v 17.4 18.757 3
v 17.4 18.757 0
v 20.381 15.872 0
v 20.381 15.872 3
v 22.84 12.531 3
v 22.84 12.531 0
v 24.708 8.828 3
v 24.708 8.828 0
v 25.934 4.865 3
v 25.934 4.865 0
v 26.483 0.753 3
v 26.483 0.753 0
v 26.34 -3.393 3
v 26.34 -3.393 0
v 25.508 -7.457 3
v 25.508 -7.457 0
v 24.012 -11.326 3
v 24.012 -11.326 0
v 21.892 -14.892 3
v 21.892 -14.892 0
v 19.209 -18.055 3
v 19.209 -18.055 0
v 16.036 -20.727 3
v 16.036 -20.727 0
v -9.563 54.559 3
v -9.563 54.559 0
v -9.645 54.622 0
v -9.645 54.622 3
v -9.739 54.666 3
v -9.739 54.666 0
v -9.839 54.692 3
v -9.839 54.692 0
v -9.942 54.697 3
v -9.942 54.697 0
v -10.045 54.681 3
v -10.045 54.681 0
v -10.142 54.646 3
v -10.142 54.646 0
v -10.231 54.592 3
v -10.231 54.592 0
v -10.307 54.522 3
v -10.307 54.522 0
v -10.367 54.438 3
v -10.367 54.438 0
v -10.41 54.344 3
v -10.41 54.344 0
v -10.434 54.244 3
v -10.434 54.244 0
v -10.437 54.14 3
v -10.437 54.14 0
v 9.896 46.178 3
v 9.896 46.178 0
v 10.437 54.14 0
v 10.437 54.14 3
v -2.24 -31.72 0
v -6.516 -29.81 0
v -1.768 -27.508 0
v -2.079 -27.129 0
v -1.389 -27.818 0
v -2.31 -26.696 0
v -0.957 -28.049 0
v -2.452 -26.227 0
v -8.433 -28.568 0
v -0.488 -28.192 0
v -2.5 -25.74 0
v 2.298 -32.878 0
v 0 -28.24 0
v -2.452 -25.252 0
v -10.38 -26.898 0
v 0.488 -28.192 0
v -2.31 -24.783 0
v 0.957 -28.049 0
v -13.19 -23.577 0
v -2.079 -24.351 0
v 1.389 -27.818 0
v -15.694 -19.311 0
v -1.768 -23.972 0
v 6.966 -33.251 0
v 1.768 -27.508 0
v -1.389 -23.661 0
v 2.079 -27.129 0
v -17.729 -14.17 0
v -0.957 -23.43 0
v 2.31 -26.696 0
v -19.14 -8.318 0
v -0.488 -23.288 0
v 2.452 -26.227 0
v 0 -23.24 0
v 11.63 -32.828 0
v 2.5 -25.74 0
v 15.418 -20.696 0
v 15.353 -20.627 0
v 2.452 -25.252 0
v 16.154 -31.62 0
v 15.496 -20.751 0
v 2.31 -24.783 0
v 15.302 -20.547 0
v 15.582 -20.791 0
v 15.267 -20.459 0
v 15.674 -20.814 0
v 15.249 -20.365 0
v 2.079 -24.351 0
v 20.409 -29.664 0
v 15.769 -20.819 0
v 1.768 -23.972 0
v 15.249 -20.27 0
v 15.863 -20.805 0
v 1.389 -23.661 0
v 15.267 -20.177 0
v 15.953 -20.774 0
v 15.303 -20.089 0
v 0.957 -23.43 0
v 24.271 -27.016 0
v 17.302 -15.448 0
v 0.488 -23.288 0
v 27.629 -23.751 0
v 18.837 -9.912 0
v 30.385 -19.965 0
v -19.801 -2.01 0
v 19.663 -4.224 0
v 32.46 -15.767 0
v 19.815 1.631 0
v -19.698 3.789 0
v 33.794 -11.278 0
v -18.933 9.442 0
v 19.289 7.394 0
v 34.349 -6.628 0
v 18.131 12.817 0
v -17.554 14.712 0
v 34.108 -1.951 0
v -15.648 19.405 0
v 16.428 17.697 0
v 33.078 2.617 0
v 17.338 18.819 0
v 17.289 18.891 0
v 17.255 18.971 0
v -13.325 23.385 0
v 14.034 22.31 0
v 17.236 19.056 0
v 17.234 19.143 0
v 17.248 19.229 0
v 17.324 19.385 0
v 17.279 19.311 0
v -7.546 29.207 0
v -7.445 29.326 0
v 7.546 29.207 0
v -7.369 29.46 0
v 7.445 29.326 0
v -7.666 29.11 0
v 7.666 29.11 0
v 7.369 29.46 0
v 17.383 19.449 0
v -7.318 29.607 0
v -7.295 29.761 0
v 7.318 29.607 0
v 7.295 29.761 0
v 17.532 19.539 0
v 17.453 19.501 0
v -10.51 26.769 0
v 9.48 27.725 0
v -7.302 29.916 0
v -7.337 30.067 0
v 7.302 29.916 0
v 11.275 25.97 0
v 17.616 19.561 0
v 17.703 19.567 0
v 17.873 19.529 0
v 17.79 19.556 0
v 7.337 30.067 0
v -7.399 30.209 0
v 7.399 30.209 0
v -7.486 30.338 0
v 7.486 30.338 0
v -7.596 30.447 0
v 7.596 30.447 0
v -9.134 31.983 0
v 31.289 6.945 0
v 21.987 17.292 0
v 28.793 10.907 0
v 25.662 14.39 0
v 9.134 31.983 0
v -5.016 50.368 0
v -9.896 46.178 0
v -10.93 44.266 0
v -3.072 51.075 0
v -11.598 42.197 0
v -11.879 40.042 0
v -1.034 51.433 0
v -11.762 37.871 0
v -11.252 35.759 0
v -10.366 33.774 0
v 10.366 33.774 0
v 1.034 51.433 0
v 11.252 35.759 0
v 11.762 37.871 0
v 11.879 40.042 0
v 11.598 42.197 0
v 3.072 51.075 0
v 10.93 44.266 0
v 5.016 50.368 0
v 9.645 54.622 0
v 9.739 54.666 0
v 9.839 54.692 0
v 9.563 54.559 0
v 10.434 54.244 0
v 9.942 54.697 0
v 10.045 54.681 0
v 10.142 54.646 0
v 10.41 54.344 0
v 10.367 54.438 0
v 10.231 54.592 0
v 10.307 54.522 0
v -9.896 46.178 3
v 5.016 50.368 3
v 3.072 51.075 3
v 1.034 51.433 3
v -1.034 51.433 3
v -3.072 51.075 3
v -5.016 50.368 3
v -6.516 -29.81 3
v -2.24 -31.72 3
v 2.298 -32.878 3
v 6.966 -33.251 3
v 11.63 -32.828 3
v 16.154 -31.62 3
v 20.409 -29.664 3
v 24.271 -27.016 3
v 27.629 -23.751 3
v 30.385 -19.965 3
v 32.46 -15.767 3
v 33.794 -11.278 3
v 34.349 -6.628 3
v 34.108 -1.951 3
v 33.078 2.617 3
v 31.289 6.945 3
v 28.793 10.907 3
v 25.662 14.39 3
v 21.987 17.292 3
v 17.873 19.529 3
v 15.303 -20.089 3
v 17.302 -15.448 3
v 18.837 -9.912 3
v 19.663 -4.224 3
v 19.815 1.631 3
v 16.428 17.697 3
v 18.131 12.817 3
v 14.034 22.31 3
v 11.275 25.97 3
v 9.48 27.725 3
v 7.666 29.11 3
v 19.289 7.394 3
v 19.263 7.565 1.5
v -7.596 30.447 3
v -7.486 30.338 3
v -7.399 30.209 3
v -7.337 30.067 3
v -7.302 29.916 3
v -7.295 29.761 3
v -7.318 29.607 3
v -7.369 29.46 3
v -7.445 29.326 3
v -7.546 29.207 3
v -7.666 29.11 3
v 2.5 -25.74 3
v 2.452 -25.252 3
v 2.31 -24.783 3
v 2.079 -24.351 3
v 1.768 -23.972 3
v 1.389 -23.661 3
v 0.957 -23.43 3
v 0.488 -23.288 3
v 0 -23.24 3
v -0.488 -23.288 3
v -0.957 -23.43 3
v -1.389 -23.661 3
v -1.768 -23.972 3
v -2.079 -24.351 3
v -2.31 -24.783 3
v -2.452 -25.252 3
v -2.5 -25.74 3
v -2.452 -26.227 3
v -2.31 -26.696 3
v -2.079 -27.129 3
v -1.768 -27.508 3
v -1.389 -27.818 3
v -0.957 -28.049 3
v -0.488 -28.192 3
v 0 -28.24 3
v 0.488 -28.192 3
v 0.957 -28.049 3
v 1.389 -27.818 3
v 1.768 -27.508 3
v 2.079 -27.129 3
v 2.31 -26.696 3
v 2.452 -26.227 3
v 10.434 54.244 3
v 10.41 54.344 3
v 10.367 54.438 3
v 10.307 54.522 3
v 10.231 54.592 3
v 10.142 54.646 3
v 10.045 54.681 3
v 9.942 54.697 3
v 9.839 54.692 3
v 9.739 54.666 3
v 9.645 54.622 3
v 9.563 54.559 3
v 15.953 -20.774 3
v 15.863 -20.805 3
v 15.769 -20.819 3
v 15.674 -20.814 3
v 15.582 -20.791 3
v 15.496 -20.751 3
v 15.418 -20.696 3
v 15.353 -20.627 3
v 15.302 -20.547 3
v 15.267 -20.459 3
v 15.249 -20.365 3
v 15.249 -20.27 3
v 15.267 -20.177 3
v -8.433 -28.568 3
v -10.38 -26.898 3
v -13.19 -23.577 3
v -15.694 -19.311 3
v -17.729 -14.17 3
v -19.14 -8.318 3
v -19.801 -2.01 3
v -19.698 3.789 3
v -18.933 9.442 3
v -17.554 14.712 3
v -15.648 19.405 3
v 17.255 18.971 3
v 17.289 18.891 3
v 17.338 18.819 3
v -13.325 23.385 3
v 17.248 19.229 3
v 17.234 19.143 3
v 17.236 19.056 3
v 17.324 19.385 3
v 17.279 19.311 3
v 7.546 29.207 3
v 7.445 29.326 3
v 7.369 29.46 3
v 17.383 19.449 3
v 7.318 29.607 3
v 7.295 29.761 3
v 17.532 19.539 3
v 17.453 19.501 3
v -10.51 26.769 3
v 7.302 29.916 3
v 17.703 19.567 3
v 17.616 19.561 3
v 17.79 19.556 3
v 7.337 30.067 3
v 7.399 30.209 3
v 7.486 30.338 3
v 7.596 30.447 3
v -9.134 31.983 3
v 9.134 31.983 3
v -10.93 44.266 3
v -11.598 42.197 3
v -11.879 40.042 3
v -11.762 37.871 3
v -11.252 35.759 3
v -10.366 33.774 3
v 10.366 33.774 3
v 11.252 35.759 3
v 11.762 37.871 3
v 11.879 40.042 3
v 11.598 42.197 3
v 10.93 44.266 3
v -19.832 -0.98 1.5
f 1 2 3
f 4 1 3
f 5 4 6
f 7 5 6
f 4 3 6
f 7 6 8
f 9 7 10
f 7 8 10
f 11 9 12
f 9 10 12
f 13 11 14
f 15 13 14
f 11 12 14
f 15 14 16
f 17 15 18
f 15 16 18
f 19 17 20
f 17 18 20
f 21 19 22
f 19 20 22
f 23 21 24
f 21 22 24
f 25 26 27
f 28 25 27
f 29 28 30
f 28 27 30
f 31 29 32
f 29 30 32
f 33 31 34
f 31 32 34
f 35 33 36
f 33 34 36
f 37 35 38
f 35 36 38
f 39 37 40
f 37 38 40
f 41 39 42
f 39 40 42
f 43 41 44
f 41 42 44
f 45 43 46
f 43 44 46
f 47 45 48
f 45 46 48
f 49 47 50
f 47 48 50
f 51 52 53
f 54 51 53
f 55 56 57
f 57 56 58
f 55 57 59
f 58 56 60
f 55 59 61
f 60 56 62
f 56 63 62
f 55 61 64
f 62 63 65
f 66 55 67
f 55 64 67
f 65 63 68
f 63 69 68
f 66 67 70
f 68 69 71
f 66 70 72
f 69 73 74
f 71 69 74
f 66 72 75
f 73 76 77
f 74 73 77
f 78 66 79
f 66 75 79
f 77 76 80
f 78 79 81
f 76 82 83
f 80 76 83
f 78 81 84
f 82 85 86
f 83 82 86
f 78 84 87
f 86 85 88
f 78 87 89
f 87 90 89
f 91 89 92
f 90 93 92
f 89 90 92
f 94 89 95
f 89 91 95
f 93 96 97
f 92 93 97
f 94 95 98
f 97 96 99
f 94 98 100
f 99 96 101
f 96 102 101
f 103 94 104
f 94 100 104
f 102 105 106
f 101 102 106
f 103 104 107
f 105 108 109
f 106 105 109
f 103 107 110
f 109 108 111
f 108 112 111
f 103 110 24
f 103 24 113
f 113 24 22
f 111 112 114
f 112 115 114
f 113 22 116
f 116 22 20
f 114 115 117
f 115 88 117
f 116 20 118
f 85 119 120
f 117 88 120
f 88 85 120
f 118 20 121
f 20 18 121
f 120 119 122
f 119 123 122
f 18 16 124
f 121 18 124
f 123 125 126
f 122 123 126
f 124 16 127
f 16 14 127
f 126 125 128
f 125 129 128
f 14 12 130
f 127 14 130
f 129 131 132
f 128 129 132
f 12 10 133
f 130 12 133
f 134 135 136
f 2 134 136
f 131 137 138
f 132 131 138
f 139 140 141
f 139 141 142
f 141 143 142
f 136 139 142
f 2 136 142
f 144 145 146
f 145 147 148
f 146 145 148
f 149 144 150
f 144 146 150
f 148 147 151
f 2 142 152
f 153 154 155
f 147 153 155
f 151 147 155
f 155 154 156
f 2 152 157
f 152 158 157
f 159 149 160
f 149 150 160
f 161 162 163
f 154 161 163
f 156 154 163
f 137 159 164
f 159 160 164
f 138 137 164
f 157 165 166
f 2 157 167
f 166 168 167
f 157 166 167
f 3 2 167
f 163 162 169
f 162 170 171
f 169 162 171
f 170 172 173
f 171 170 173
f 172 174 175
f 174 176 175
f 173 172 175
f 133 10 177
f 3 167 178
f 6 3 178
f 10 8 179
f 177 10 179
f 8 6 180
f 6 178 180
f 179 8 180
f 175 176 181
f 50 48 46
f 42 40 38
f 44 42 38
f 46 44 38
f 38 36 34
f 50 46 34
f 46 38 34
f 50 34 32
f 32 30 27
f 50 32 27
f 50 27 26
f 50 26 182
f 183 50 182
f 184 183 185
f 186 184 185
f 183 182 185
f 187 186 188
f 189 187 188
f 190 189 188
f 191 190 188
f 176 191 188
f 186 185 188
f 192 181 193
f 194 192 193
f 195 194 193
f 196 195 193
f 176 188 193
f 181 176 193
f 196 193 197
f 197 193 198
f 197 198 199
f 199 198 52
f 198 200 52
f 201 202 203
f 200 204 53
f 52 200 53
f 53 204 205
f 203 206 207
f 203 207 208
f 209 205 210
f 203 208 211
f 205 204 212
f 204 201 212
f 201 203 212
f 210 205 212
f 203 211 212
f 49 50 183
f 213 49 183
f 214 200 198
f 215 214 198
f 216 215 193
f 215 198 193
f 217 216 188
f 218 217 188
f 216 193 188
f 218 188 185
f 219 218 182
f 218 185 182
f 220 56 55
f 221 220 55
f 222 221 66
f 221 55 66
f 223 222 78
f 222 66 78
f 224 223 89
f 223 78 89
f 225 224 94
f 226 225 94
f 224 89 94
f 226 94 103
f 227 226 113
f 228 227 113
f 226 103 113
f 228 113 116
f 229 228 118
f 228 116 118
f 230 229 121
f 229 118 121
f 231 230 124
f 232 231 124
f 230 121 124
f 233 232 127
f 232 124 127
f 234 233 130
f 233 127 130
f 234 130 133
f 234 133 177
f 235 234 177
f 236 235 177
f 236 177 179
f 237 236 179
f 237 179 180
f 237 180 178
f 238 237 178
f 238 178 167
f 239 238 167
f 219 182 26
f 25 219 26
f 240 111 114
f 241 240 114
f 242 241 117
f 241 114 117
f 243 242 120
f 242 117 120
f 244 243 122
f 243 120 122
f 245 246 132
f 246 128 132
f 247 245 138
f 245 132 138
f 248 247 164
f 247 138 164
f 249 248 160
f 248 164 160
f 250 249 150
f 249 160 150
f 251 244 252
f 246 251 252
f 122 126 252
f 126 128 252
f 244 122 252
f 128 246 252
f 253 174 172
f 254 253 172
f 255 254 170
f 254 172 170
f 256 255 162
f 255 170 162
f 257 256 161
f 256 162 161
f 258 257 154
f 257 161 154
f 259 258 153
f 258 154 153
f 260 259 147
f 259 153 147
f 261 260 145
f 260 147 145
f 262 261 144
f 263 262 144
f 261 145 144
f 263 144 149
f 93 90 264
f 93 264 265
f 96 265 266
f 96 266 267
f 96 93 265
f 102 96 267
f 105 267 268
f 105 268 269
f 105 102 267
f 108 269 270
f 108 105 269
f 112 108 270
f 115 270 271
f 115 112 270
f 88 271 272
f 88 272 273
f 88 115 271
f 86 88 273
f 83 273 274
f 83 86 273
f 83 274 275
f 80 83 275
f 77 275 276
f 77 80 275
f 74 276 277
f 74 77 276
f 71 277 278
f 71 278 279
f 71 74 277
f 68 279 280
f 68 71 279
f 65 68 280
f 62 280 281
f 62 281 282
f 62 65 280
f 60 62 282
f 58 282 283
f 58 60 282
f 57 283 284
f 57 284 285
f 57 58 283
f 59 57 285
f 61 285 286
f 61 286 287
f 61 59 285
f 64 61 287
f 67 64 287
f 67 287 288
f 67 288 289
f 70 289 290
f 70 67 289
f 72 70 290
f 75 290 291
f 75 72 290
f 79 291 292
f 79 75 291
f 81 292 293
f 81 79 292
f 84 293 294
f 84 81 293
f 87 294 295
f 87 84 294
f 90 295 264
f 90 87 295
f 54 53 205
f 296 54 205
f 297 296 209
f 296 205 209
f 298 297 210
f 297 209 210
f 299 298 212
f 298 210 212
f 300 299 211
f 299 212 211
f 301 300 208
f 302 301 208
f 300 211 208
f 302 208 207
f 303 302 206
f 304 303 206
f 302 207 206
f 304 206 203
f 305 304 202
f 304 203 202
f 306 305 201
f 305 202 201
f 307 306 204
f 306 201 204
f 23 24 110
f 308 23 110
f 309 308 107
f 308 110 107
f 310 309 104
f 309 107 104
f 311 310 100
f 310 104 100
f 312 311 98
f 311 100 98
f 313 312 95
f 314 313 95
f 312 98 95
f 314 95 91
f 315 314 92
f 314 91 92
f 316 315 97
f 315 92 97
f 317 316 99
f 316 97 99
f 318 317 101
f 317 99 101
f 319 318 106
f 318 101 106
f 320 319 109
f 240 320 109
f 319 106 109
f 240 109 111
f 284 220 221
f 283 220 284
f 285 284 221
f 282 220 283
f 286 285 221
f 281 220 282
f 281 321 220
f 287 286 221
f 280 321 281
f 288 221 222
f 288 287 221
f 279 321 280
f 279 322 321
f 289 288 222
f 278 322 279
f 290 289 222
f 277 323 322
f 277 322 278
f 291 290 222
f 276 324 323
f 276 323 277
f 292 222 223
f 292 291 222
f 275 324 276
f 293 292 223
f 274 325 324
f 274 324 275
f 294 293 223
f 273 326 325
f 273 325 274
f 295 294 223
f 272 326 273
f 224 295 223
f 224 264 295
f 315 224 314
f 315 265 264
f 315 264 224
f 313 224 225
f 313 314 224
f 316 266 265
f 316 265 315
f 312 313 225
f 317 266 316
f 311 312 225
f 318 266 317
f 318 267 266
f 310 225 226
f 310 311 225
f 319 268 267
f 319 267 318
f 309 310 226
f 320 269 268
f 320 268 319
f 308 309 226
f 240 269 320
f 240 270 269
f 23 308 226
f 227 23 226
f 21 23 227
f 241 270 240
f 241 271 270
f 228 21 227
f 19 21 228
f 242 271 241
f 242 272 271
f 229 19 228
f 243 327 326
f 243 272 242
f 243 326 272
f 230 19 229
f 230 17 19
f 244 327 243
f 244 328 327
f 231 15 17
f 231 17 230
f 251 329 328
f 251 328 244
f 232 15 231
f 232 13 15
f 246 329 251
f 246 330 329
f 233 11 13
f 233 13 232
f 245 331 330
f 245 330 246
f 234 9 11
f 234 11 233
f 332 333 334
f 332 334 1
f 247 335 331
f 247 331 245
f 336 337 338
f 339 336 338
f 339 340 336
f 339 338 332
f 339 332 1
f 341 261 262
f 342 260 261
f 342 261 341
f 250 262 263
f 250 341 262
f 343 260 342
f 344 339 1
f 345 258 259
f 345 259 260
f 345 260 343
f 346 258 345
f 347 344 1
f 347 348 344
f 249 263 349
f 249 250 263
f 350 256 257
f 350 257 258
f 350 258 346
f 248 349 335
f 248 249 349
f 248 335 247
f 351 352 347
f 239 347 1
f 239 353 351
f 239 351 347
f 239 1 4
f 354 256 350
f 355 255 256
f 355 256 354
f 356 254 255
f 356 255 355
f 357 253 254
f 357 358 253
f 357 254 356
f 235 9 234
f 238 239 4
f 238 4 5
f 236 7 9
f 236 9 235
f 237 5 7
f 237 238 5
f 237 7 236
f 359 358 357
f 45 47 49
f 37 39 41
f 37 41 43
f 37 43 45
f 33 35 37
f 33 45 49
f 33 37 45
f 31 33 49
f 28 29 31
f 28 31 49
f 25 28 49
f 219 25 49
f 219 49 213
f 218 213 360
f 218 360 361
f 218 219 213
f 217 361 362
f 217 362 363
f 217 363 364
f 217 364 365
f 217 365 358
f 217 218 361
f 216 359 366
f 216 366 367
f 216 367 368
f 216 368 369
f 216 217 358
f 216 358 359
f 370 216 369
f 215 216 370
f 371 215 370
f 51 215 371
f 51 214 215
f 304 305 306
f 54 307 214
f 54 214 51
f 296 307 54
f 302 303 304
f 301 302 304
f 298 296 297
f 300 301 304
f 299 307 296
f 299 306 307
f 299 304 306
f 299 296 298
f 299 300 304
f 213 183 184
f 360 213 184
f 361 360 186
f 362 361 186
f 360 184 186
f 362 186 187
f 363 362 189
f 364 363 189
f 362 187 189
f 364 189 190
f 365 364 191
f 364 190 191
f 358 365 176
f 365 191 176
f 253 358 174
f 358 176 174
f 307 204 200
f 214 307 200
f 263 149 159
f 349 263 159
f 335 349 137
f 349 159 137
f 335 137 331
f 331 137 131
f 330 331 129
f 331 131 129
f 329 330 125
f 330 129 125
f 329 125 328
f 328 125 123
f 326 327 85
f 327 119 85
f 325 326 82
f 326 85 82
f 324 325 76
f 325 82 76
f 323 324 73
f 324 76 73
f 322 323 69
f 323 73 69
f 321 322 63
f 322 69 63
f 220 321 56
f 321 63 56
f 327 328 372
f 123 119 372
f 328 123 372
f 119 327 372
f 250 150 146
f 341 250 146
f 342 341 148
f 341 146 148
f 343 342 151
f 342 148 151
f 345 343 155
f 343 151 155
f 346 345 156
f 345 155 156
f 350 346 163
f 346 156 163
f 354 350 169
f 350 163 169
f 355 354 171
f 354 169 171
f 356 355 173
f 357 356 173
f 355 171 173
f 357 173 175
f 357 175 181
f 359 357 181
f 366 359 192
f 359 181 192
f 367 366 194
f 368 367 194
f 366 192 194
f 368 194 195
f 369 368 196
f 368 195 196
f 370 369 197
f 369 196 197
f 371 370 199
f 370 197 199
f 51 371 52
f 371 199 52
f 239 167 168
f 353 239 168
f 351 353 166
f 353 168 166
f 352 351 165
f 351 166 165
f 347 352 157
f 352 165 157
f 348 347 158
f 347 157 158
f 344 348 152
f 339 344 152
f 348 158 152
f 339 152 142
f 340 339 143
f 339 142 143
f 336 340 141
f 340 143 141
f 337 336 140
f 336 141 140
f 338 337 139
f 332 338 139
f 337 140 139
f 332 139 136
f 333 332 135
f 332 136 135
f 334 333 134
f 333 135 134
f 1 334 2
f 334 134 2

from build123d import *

# Parameters (mm, degrees)
F0_R     = 2.5
F1_DEPTH = 3


with BuildPart() as f1:
    # F0 (on Top) → F1 (new body)
    with BuildSketch(Plane.XY):
        with BuildLine():
            ThreePointArc((-7.5958592746, 30.447376996), (-7.2954421995, 29.7607968689), (-7.6664191036, 29.1096295889))
            add(Edge.make_bspline(
                [(-7.6664191036, 29.1096295889), (-55.464118768, -2.7410070687), (-6.5156015718, -29.8104974613)],
                knots=[0.3967115562, 0.3967115562, 0.3967115562, 2.8069981351, 2.8069981351, 2.8069981351], degree=2, weights=[1, 0.357559236, 1]))
            ThreePointArc((-6.5156015718, -29.8104974613), (31.5120821846, -17.9102618156), (17.8725918917, 19.5288172976))
            ThreePointArc((17.8725918917, 19.5288172976), (17.2999162533, 19.3489700798), (17.4003215692, 18.7571751989))
            ThreePointArc((17.4003215692, 18.7571751989), (26.4978981224, -1.3229207129), (16.0357766574, -20.7270482486))
            ThreePointArc((16.0357766574, -20.7270482486), (15.418361067, -20.6961037556), (15.3029208356, -20.0887874247))
            add(Edge.make_bspline(
                [(15.3029208356, -20.0887874247), (32.3088785024, 12.6887970766), (7.6664191036, 29.1096295889)],
                knots=[4.022421846, 4.022421846, 4.022421846, 5.886473751, 5.886473751, 5.886473751], degree=2, weights=[1, 0.5962087126, 1]))
            ThreePointArc((7.6664191036, 29.1096295889), (7.2954421995, 29.7607968689), (7.5958592746, 30.447376996))
            ThreePointArc((7.5958592746, 30.447376996), (11.762218697, 37.8714882822), (9.8957824129, 46.1776543547))
            Line((9.8957824129, 46.1776543547), (10.4372317457, 54.1401412002))
            ThreePointArc((10.4372317457, 54.1401412002), (10.142102083, 54.646218012), (9.5627349759, 54.5593329591))
            Line((9.5627349759, 54.5593329591), (5.0160304443, 50.3683832584))
            ThreePointArc((5.0160304443, 50.3683832584), (0, 51.478518162), (-5.0160304443, 50.3683832584))
            Line((-5.0160304443, 50.3683832584), (-9.5627349759, 54.5593329591))
            ThreePointArc((-9.5627349759, 54.5593329591), (-10.142102083, 54.646218012), (-10.4372317457, 54.1401412002))
            Line((-10.4372317457, 54.1401412002), (-9.8957824129, 46.1776543547))
            ThreePointArc((-9.8957824129, 46.1776543547), (-11.762218697, 37.8714882822), (-7.5958592746, 30.447376996))
        make_face()
        with Locations((0, -25.7397647947)):
            Circle(F0_R, mode=Mode.SUBTRACT)
    extrude(amount=F1_DEPTH)


solid = f1.part
